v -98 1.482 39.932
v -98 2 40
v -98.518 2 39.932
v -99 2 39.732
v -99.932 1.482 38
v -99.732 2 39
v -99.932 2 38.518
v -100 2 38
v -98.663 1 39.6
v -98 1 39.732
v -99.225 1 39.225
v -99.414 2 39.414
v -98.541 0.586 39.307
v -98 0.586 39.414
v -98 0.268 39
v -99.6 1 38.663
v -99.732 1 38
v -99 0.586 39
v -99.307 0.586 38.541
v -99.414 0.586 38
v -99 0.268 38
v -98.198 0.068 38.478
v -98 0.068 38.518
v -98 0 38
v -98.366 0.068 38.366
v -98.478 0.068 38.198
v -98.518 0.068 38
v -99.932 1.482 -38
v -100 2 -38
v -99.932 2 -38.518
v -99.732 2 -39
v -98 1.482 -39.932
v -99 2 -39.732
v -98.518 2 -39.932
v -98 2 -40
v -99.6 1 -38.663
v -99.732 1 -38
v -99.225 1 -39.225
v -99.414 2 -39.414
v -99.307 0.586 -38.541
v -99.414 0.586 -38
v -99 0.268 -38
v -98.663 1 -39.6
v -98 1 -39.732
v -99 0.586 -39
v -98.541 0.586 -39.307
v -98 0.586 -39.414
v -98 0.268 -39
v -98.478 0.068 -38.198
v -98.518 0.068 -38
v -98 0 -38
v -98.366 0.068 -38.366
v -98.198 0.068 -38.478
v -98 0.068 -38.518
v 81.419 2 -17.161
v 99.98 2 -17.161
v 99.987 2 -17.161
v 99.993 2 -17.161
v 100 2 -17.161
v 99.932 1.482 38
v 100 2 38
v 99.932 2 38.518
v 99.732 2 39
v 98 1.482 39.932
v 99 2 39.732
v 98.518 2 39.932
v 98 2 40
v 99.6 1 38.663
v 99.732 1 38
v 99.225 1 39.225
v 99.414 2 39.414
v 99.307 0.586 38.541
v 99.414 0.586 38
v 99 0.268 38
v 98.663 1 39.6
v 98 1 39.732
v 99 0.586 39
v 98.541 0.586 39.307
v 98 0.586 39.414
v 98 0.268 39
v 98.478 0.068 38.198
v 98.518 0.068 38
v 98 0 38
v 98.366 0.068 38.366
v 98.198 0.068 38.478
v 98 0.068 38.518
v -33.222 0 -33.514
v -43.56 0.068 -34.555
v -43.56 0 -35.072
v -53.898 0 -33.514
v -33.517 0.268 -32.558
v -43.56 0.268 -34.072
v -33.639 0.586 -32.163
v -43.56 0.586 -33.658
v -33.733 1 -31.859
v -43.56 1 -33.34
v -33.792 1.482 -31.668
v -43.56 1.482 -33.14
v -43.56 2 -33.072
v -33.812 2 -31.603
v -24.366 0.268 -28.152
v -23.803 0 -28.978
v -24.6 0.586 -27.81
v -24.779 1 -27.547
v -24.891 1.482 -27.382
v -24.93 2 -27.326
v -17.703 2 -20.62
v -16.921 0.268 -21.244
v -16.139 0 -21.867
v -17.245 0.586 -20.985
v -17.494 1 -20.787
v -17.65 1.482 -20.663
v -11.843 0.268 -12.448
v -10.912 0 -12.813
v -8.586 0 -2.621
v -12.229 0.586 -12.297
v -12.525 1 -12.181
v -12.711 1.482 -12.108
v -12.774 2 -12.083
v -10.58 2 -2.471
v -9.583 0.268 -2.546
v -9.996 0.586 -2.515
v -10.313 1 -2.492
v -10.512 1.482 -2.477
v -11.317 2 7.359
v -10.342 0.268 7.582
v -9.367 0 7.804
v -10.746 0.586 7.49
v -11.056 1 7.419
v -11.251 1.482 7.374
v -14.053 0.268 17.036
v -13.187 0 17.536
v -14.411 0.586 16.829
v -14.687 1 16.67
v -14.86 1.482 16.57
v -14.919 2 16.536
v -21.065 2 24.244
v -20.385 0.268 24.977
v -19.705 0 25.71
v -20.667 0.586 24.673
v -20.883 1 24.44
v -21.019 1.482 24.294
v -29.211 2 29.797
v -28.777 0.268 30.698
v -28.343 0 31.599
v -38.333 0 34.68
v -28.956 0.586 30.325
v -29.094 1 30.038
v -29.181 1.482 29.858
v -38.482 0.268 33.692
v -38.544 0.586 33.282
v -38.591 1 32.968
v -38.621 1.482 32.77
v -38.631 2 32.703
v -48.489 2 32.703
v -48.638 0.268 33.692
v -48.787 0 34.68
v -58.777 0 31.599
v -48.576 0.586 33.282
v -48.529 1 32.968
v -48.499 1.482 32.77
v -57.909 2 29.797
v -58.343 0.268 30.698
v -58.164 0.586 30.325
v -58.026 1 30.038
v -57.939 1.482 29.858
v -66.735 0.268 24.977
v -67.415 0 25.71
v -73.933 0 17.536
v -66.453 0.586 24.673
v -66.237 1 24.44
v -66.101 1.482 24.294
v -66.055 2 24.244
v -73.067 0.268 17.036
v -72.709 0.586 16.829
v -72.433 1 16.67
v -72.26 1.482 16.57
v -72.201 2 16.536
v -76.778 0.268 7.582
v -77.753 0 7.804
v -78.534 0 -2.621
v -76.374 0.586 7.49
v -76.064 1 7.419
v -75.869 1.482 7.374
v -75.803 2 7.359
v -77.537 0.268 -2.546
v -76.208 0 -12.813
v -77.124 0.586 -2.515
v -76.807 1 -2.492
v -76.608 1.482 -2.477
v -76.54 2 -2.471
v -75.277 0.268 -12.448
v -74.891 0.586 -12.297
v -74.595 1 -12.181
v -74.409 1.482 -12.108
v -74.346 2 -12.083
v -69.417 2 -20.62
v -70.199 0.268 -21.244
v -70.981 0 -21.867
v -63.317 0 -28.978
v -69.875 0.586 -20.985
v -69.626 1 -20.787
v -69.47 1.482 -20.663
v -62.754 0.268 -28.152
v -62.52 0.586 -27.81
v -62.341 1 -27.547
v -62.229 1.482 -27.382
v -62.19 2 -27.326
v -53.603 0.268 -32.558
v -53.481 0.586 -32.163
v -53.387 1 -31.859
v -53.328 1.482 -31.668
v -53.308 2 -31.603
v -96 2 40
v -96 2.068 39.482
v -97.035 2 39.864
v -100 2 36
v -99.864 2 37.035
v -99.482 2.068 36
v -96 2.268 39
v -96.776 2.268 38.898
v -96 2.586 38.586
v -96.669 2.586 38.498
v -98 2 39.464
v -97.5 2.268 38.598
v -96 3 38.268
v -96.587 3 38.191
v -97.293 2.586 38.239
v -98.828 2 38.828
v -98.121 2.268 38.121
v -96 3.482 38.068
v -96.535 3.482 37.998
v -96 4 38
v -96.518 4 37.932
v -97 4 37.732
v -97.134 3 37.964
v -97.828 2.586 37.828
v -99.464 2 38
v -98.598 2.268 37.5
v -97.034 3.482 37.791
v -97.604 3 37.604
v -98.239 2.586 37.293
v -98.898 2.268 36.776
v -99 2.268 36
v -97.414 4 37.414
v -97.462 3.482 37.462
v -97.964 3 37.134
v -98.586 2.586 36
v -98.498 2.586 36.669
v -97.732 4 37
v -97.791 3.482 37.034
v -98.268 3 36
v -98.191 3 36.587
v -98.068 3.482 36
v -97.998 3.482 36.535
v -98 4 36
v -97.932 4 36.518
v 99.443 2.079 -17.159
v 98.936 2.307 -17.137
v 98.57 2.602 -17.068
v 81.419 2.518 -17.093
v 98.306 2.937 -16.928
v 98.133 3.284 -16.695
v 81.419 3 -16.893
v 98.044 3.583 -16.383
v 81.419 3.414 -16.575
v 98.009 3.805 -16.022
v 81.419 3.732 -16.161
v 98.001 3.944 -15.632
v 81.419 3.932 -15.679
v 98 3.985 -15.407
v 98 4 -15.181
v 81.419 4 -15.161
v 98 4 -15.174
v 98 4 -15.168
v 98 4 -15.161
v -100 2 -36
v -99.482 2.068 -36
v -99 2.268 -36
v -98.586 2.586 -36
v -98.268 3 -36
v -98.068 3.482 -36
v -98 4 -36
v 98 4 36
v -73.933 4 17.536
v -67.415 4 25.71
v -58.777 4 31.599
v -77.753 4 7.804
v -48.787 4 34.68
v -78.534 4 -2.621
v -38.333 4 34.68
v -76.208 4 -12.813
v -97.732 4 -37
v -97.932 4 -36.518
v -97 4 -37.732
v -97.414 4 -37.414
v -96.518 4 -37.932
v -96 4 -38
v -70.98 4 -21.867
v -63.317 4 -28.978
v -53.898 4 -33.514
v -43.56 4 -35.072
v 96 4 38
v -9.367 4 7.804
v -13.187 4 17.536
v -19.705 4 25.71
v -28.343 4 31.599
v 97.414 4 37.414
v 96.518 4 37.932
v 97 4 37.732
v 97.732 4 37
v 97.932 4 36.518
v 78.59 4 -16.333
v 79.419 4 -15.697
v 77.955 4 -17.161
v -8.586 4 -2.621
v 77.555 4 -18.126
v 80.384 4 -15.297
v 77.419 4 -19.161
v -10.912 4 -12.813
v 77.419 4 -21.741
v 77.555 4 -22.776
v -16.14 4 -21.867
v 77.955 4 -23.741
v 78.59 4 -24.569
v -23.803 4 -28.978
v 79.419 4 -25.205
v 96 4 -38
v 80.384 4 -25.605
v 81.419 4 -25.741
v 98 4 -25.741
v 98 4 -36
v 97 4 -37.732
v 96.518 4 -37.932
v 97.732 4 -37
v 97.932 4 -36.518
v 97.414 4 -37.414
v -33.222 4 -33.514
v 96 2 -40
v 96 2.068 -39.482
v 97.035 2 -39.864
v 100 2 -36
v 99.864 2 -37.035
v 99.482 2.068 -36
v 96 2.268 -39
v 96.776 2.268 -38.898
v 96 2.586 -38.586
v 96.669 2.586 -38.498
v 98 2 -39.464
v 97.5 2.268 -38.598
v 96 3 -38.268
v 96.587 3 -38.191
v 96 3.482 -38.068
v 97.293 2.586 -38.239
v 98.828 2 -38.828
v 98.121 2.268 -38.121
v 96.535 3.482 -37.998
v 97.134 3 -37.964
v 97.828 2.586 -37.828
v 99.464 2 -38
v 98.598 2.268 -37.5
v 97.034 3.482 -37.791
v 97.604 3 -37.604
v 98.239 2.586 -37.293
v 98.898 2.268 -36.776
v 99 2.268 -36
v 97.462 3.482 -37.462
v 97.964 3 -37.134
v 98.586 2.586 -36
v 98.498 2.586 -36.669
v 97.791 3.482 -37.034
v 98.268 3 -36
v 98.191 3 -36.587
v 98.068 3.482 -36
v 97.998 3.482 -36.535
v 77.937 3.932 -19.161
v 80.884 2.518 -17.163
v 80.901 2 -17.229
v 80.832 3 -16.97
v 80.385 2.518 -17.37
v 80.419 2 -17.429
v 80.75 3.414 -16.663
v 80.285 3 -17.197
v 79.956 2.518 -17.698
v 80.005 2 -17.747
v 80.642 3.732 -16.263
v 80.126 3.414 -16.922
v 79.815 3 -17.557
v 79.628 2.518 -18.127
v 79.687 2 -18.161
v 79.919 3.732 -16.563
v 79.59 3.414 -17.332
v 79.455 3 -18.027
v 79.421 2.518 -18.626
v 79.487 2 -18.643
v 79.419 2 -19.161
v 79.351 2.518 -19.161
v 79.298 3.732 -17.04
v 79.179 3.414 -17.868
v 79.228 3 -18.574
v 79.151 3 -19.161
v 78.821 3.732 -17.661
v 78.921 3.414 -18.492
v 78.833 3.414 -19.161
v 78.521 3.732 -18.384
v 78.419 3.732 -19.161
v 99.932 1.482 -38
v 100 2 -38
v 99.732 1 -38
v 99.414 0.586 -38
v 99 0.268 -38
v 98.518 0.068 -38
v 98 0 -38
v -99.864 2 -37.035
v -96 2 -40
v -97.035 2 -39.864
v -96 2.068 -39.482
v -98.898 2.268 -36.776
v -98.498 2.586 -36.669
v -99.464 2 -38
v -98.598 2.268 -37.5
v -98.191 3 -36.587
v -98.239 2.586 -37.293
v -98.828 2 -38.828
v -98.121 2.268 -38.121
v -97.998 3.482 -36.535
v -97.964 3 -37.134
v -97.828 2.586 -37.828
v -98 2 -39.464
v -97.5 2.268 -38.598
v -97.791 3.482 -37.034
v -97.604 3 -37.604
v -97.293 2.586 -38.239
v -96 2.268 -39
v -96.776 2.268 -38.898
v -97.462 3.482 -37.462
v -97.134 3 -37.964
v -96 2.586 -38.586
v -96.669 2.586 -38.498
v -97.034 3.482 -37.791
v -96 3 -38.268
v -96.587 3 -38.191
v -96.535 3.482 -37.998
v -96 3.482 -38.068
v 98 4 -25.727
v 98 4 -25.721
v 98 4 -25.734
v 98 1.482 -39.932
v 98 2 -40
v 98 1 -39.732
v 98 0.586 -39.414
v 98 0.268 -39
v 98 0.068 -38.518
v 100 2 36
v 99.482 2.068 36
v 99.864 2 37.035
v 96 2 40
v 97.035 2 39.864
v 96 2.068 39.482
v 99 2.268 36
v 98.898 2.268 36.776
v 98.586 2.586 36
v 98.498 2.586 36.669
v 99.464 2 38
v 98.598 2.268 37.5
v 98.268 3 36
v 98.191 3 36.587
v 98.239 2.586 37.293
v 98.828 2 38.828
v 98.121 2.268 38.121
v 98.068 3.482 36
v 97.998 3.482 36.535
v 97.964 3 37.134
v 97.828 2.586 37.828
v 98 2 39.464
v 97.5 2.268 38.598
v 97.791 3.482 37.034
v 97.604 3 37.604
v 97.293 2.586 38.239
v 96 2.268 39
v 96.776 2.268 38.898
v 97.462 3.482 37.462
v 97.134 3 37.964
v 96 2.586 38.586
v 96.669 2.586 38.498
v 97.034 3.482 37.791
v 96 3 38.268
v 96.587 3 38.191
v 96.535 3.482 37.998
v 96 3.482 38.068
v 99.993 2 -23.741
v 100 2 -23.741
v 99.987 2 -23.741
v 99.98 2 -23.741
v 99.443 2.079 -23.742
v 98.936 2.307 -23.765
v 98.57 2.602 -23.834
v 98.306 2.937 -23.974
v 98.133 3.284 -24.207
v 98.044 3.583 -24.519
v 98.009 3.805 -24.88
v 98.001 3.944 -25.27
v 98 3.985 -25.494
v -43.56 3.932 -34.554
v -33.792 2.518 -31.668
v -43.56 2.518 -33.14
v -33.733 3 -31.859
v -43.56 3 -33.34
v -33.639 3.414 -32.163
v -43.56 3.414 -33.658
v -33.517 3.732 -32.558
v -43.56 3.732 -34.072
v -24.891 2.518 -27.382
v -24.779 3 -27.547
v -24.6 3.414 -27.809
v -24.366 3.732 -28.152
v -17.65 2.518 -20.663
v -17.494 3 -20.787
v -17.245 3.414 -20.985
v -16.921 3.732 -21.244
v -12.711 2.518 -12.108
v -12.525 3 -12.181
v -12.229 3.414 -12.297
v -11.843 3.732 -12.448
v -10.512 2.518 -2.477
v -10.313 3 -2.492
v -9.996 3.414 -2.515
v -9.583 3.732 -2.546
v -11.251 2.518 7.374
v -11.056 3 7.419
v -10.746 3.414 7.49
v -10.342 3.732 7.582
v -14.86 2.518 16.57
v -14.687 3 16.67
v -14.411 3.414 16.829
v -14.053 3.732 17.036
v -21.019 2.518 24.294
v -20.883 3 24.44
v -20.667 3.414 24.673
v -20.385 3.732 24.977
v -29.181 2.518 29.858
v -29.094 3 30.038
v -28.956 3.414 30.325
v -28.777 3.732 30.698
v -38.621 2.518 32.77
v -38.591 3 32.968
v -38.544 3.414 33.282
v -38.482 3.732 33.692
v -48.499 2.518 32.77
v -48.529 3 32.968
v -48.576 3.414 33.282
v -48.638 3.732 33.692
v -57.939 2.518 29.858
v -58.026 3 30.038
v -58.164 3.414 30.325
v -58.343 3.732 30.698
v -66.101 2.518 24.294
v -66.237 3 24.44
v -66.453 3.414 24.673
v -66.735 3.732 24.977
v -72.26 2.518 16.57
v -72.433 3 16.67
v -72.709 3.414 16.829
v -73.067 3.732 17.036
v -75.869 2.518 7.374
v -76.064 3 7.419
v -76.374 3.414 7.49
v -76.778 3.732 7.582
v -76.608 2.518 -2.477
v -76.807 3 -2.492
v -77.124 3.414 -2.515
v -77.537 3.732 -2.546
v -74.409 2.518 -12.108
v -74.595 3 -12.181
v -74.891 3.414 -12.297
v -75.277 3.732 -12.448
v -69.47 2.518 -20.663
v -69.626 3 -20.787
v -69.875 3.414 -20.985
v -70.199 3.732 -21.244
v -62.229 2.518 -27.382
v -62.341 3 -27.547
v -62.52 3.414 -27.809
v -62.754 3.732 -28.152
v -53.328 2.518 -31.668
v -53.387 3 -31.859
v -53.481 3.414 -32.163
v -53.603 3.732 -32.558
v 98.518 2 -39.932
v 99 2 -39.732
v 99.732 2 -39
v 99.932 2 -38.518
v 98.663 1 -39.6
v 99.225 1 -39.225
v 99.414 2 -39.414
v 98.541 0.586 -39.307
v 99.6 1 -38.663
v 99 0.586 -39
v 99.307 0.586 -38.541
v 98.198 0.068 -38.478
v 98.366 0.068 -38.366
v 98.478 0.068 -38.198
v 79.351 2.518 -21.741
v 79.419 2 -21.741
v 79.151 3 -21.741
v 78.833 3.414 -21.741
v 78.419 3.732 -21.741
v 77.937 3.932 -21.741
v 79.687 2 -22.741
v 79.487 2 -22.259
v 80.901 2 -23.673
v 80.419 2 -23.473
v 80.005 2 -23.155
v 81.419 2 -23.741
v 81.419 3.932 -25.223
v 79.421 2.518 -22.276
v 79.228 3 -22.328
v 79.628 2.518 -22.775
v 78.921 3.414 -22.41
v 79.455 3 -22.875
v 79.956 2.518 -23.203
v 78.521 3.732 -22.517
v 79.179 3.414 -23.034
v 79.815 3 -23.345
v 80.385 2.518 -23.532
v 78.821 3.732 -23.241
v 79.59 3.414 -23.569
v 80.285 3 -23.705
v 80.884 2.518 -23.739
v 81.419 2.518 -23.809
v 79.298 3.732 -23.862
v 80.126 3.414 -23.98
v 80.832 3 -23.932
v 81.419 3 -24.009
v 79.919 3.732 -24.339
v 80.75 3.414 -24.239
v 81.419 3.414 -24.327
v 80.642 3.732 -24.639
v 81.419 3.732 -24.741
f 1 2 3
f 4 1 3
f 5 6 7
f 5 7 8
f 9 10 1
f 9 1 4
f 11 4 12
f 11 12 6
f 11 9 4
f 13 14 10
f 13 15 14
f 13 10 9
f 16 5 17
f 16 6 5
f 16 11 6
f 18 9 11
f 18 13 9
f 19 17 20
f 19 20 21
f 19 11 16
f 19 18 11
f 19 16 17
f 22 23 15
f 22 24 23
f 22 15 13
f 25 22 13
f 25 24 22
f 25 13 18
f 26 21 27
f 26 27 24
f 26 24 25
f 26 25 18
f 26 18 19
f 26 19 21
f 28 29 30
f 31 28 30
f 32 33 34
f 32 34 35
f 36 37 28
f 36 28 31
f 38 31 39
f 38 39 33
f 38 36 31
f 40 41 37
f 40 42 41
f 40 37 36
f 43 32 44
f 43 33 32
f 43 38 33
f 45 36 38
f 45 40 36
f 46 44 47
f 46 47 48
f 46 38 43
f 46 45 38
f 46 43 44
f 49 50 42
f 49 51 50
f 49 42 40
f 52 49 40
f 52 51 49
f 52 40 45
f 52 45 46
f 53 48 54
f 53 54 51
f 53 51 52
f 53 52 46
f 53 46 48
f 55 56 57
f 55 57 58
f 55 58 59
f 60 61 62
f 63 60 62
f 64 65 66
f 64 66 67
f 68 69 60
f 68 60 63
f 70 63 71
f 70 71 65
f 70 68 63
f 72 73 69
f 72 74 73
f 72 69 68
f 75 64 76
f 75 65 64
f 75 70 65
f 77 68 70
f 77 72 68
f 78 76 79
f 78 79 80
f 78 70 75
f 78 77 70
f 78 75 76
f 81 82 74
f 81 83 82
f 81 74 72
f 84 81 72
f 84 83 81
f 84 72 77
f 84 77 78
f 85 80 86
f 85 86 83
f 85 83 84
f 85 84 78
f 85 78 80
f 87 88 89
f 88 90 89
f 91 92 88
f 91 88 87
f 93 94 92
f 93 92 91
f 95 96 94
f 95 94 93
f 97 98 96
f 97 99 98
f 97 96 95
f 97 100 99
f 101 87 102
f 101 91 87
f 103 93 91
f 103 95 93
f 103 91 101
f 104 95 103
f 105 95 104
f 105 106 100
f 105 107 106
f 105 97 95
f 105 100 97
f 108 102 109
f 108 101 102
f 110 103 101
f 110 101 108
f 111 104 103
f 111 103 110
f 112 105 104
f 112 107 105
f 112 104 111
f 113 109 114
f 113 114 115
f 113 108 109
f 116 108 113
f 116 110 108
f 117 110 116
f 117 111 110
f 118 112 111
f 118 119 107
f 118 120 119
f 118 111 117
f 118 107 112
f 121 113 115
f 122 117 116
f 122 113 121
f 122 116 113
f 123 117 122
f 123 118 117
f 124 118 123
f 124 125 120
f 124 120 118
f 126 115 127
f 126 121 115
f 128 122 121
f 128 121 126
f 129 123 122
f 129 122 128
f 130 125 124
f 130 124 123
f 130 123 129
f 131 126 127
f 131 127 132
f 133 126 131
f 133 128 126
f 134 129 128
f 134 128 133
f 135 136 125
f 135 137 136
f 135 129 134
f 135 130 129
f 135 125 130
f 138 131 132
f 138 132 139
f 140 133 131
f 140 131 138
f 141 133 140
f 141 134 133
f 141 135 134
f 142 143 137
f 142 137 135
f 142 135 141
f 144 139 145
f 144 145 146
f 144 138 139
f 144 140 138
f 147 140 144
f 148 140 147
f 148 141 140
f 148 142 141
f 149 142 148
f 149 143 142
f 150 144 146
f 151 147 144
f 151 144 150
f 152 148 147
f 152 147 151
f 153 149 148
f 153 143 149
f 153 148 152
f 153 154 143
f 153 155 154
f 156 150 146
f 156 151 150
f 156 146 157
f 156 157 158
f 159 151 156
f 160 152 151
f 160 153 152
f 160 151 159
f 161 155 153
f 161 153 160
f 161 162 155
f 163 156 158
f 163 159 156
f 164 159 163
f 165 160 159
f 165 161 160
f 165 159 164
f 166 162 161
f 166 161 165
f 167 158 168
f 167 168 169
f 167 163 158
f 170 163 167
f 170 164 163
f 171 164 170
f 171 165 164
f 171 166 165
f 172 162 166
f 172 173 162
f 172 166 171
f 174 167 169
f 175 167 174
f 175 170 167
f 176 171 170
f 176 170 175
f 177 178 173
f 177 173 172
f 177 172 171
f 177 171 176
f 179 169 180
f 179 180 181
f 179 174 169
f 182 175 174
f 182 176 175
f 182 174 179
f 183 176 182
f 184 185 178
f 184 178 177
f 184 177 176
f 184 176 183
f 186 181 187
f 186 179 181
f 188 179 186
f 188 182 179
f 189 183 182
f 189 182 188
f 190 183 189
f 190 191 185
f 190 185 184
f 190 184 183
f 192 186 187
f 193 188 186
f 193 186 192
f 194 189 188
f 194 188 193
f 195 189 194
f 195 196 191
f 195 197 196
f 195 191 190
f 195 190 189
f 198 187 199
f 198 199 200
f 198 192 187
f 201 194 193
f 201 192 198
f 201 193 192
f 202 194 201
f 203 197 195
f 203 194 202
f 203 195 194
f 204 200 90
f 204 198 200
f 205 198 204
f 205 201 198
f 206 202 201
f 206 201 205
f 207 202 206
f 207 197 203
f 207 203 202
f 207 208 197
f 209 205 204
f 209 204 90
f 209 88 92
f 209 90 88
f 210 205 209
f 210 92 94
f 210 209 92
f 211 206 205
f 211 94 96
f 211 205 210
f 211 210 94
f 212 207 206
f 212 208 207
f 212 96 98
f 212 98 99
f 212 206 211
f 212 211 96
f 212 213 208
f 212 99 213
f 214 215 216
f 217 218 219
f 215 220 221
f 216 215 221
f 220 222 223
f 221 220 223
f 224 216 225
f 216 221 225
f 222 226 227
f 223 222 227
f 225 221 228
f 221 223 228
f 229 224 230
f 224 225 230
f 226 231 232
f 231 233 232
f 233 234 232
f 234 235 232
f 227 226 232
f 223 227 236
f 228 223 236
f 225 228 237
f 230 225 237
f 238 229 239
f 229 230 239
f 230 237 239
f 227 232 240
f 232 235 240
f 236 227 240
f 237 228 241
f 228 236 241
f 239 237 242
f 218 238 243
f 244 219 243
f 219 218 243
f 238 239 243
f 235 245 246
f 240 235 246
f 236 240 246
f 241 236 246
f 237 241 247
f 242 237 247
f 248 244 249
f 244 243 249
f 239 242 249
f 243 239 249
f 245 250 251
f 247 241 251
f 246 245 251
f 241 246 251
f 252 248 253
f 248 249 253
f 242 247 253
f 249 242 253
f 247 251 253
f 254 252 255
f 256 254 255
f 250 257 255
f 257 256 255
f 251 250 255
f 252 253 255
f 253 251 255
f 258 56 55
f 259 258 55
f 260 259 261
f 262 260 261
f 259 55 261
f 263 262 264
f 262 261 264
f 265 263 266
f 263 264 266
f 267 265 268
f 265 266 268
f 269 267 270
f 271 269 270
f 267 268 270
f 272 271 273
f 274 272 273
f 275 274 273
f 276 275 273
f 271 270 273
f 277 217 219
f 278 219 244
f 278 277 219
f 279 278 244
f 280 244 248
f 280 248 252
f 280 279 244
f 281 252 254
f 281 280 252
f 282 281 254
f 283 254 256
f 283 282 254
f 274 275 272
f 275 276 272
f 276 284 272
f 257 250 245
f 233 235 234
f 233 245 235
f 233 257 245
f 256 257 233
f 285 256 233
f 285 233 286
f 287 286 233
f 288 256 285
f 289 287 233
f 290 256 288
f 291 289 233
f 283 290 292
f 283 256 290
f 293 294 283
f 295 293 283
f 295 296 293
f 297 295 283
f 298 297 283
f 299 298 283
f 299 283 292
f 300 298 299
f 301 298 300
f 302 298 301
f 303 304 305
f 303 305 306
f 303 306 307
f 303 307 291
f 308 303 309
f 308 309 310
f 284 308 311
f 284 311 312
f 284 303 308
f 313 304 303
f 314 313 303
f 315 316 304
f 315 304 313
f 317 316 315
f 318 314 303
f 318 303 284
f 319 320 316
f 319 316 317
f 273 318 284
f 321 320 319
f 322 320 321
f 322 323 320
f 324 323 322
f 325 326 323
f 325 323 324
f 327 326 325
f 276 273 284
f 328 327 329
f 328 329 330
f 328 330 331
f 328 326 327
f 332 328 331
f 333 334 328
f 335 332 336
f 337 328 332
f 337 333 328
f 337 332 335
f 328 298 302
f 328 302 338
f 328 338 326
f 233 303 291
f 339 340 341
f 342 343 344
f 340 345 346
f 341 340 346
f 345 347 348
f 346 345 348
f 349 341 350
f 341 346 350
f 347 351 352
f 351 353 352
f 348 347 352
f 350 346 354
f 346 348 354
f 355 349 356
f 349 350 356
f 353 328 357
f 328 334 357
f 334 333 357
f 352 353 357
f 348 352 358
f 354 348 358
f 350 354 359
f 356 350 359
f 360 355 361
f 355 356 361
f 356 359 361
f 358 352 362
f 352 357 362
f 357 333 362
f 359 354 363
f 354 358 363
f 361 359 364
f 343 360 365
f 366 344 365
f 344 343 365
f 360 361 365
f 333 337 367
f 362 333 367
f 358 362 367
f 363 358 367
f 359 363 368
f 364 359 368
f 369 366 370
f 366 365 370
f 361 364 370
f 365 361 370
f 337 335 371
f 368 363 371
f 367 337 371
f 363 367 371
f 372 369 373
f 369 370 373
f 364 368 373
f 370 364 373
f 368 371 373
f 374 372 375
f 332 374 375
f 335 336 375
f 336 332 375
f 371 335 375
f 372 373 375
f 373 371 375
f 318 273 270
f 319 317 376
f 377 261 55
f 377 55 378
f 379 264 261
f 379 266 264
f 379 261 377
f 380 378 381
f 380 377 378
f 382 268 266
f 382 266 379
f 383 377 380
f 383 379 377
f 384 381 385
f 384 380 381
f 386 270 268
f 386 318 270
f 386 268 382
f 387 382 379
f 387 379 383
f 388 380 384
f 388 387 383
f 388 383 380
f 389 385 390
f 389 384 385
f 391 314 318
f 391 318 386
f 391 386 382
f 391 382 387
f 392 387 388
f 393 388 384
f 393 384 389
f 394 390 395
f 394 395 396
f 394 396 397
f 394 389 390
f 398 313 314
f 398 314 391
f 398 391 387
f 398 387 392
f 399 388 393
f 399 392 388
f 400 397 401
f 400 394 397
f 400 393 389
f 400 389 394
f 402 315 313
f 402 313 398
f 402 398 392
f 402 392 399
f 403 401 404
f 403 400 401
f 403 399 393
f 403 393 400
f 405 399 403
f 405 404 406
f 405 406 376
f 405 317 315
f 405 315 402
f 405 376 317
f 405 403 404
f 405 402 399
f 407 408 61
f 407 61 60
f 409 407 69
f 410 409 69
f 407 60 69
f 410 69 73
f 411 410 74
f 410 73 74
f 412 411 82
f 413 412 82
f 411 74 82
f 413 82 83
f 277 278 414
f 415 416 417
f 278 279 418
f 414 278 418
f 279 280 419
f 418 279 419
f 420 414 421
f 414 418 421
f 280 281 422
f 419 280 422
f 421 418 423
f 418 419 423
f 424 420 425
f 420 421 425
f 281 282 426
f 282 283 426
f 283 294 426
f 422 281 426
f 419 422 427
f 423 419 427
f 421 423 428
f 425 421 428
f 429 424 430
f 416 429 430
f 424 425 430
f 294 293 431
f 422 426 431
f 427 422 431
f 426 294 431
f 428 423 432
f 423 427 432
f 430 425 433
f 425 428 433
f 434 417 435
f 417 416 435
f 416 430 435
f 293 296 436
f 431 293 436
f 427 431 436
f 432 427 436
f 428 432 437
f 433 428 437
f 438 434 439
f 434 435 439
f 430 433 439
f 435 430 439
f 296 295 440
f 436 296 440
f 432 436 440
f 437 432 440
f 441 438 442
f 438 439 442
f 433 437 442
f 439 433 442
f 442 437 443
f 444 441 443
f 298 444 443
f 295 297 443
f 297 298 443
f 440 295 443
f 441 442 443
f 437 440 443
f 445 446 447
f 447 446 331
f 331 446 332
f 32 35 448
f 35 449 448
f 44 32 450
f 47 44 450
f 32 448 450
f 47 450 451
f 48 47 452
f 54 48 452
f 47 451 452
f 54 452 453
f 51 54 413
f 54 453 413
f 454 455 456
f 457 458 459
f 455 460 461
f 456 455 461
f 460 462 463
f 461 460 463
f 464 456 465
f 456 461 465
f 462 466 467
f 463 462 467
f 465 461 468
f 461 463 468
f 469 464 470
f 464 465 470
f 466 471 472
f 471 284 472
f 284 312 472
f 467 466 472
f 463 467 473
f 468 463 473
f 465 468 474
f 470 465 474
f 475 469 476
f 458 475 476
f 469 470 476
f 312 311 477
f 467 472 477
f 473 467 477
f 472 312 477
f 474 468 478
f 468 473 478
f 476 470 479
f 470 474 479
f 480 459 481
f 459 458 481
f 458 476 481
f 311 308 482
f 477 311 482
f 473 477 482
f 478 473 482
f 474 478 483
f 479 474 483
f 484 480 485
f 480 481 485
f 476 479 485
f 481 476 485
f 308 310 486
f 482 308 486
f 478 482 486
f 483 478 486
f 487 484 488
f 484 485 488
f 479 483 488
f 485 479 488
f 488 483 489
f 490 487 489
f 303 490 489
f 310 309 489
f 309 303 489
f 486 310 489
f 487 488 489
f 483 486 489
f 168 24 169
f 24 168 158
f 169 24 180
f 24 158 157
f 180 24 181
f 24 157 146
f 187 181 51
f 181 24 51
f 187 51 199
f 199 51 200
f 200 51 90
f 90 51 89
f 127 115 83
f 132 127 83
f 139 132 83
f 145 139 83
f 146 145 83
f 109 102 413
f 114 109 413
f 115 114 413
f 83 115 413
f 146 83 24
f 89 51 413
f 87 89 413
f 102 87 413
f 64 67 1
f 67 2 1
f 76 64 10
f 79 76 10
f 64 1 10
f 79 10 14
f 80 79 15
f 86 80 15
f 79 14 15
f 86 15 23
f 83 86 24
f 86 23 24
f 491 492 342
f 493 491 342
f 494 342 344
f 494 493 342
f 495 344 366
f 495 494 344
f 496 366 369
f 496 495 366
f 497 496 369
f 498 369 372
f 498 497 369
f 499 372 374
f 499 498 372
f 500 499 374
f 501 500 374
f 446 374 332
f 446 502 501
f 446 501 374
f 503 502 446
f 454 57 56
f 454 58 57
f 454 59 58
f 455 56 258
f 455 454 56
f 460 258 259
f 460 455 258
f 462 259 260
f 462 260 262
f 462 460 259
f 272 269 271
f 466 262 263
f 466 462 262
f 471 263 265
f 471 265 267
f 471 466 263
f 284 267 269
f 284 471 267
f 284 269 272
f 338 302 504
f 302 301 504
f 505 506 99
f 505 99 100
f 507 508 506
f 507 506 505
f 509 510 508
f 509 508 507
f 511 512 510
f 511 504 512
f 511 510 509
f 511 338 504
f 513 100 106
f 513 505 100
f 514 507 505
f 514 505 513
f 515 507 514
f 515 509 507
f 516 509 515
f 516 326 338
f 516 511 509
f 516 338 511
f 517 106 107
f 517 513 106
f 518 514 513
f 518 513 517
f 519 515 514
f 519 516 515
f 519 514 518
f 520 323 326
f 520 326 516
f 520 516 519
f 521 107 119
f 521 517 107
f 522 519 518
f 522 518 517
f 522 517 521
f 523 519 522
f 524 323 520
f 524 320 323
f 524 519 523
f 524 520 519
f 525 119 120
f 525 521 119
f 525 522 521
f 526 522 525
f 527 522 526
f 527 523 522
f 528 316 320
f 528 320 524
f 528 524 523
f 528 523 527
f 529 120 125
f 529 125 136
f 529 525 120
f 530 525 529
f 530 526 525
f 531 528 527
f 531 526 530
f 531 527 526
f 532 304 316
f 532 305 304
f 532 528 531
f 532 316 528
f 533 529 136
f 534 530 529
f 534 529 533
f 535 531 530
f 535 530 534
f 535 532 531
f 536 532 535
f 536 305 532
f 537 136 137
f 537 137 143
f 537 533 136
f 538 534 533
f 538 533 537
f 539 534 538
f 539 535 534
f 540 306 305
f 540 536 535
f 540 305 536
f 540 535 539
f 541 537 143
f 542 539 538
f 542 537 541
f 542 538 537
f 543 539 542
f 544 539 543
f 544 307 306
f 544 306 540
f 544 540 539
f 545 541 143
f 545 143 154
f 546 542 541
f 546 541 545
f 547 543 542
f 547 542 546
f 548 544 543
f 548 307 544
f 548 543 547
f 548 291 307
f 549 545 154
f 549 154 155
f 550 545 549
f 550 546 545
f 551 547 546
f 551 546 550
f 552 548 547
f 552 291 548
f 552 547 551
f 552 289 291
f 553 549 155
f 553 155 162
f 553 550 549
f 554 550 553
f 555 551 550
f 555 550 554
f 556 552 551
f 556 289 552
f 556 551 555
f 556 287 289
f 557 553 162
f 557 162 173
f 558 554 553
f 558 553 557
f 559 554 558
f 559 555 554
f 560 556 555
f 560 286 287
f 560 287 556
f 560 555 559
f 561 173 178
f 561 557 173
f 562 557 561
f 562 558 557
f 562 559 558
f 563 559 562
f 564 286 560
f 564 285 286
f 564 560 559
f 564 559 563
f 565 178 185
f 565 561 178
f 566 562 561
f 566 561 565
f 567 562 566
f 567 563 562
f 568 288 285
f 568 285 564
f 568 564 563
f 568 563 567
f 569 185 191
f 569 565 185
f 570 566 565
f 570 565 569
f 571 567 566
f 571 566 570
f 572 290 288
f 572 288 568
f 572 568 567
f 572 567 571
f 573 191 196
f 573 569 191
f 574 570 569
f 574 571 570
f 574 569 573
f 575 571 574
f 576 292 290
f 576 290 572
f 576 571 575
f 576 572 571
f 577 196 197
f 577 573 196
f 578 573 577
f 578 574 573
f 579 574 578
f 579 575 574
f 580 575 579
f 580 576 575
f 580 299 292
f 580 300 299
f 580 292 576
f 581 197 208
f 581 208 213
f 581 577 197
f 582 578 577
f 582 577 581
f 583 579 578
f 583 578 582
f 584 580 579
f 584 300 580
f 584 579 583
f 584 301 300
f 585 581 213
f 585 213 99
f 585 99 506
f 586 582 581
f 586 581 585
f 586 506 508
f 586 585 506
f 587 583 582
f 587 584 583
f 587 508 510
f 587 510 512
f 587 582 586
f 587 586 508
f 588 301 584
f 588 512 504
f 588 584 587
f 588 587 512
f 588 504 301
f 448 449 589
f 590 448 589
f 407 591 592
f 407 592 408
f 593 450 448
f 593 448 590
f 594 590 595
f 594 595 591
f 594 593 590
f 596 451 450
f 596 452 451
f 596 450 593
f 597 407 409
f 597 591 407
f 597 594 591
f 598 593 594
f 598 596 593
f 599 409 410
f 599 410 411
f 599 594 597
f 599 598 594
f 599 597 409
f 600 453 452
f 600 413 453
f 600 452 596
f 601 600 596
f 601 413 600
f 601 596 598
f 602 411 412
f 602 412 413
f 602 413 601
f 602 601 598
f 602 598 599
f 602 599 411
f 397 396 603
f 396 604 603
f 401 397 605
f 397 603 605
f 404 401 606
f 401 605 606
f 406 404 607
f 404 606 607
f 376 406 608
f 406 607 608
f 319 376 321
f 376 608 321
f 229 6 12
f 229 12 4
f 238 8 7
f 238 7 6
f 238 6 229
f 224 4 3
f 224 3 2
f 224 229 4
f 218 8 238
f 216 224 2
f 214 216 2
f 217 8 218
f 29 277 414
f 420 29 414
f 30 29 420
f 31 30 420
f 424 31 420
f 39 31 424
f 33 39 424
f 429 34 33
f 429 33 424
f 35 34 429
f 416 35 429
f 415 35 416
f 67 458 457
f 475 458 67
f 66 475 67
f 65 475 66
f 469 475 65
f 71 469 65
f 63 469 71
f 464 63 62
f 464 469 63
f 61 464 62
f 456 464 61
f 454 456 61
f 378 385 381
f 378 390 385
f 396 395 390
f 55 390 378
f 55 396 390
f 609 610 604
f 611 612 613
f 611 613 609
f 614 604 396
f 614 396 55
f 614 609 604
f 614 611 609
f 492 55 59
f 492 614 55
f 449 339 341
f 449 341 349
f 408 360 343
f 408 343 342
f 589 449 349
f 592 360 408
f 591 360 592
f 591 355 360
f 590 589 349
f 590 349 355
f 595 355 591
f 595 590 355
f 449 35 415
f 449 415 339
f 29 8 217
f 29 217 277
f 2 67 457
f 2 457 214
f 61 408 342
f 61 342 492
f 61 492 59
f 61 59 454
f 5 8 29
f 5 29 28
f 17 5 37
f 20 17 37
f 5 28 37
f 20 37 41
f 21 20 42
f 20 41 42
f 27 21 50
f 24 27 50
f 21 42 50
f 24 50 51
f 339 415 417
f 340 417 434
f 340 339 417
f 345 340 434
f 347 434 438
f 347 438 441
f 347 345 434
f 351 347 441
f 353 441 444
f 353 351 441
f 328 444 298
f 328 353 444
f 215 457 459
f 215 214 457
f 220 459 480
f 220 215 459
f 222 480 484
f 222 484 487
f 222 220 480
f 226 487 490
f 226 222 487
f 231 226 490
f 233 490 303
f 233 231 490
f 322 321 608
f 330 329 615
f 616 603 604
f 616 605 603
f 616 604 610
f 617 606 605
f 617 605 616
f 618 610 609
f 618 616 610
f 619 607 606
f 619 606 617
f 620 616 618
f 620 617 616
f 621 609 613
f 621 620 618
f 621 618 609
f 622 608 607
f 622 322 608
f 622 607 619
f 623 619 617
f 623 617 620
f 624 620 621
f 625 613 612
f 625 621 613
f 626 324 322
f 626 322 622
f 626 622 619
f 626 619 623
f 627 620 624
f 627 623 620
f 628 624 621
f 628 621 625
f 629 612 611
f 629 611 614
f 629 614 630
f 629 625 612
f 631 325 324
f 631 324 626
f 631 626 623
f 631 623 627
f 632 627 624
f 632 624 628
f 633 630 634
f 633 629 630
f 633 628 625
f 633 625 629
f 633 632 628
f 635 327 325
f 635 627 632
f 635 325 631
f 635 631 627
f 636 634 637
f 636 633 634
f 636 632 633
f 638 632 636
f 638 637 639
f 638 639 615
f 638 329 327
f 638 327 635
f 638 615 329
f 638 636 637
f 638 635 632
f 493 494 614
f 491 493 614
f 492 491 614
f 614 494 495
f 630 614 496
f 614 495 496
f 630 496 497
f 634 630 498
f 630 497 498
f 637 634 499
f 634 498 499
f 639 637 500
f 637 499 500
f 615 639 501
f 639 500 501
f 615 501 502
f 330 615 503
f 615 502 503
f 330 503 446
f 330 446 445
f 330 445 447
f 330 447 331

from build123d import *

# Parameters (mm, degrees)
SKETCH1_W           = 200
SKETCH1_H           = 80
BOSS_EXTRUDE1_DEPTH = 2
SKETCH2_W           = 196
SKETCH2_H           = 76
BOSS_EXTRUDE2_DEPTH = 2
FILLET1_R           = 2
FILLET2_R           = 2
FILLET3_R           = 2
SKETCH3_R           = 33.072163117
CUT_EXTRUDE1_DEPTH  = 25
FILLET4_R           = 2
FILLET5_R           = 2
SKETCH4_W           = 18.581197799
SKETCH4_H           = 6.58
CUT_EXTRUDE3_DEPTH  = 2
SKETCH5_W           = 3.741738876
SKETCH5_H           = 6.58
CUT_EXTRUDE4_DEPTH  = 2
FILLET6_R           = 2
FILLET7_R           = 2


with BuildPart() as part:
    # Sketch1 → Boss-Extrude1 (new body)
    with BuildSketch(Plane(origin=(0, 0, 0), x_dir=(1, 0, 0), z_dir=(0, 1, 0))):
        Rectangle(SKETCH1_W, SKETCH1_H)
    extrude(amount=BOSS_EXTRUDE1_DEPTH)

    # Sketch2 → Boss-Extrude2 (add)
    with BuildSketch(Plane(origin=(0, 2, 0), x_dir=(1, 0, 0), z_dir=(0, 1, 0))):
        Rectangle(SKETCH2_W, SKETCH2_H)
    extrude(amount=BOSS_EXTRUDE2_DEPTH)

    # Fillet1
    fillet1_edges = [part.edges().sort_by_distance(p)[0] for p in [
        (-100, 1, -40),
        (100, 1, -40),
        (100, 1, 40),
        (-100, 1, 40),
    ]]
    fillet(fillet1_edges, radius=FILLET1_R)

    # Fillet2
    fillet2_edges = [part.edges().sort_by_distance(p)[0] for p in [
        (-98, 3, -38),
        (-98, 3, 38),
        (98, 3, 38),
        (98, 3, -38),
    ]]
    fillet(fillet2_edges, radius=FILLET2_R)

    # Fillet3
    fillet3_edges = [part.edges().sort_by_distance(p)[0] for p in [
        (-99.414213562, 0, -39.414213562),
        (0, 0, -40),
        (99.414213562, 0, -39.414213562),
        (100, 0, 0),
        (99.414213562, 0, 39.414213562),
        (0, 0, 40),
        (-99.414213562, 0, 39.414213562),
        (-97.414213562, 2, 37.414213562),
        (-98, 2, 0),
        (-97.414213562, 2, -37.414213562),
        (0, 2, -38),
        (97.414213562, 2, -37.414213562),
        (98, 2, 0),
        (97.414213562, 2, 37.414213562),
        (-100, 0, 0),
        (0, 2, 38),
    ]]
    fillet(fillet3_edges, radius=FILLET3_R - 0.0001)  # a hair under: the kernel refuses the full size

    # Sketch3 → Cut-Extrude1 (cut)
    with BuildSketch(Plane.XZ):
        with Locations(Location((-43.56, 0, 0), (0, 0, 270))):
            Circle(SKETCH3_R)
    extrude(amount=-CUT_EXTRUDE1_DEPTH, mode=Mode.SUBTRACT)

    # Fillet4
    fillet4_edges = [part.edges().sort_by_distance(p)[0] for p in [
        (-43.56, 0, 33.072163117),
    ]]
    fillet(fillet4_edges, radius=FILLET4_R)

    # Fillet5
    fillet5_edges = [part.edges().sort_by_distance(p)[0] for p in [
        (-43.56, 4, 33.072163117),
    ]]
    fillet(fillet5_edges, radius=FILLET5_R - 0.0001)  # a hair under: the kernel refuses the full size

    # Sketch4 → Cut-Extrude3 (cut)
    with BuildSketch(Plane(origin=(0, 4, 0), x_dir=(1, 0, 0), z_dir=(0, 1, 0))):
        with Locations((88.709401101, 20.450898194)):
            Rectangle(SKETCH4_W, SKETCH4_H)
    extrude(amount=-CUT_EXTRUDE3_DEPTH, mode=Mode.SUBTRACT)

    # Sketch5 → Cut-Extrude4 (cut)
    with BuildSketch(Plane(origin=(0, 2, 0), x_dir=(1, 0, 0), z_dir=(0, 1, 0))):
        with Locations((99.870869438, 20.450898194)):
            Rectangle(SKETCH5_W, SKETCH5_H)
    extrude(amount=CUT_EXTRUDE4_DEPTH, mode=Mode.SUBTRACT)

    # Fillet6
    fillet6_edges = [part.edges().sort_by_distance(p)[0] for p in [
        (79.418802201, 3, -17.160898194),
        (79.418802201, 3, -23.740898194),
    ]]
    fillet(fillet6_edges, radius=FILLET6_R)

    # Fillet7
    fillet7_edges = [part.edges().sort_by_distance(p)[0] for p in [
        (80.004588639, 4, -17.746684631),
        (80.004588639, 4, -23.155111756),
        (79.418802201, 4, -20.450898194),
        (89.709401101, 4, -17.160898194),
        (89.709401101, 4, -23.740898194),
    ]]
    fillet(fillet7_edges, radius=FILLET7_R - 0.0001)  # a hair under: the kernel refuses the full size


solid = part.part
